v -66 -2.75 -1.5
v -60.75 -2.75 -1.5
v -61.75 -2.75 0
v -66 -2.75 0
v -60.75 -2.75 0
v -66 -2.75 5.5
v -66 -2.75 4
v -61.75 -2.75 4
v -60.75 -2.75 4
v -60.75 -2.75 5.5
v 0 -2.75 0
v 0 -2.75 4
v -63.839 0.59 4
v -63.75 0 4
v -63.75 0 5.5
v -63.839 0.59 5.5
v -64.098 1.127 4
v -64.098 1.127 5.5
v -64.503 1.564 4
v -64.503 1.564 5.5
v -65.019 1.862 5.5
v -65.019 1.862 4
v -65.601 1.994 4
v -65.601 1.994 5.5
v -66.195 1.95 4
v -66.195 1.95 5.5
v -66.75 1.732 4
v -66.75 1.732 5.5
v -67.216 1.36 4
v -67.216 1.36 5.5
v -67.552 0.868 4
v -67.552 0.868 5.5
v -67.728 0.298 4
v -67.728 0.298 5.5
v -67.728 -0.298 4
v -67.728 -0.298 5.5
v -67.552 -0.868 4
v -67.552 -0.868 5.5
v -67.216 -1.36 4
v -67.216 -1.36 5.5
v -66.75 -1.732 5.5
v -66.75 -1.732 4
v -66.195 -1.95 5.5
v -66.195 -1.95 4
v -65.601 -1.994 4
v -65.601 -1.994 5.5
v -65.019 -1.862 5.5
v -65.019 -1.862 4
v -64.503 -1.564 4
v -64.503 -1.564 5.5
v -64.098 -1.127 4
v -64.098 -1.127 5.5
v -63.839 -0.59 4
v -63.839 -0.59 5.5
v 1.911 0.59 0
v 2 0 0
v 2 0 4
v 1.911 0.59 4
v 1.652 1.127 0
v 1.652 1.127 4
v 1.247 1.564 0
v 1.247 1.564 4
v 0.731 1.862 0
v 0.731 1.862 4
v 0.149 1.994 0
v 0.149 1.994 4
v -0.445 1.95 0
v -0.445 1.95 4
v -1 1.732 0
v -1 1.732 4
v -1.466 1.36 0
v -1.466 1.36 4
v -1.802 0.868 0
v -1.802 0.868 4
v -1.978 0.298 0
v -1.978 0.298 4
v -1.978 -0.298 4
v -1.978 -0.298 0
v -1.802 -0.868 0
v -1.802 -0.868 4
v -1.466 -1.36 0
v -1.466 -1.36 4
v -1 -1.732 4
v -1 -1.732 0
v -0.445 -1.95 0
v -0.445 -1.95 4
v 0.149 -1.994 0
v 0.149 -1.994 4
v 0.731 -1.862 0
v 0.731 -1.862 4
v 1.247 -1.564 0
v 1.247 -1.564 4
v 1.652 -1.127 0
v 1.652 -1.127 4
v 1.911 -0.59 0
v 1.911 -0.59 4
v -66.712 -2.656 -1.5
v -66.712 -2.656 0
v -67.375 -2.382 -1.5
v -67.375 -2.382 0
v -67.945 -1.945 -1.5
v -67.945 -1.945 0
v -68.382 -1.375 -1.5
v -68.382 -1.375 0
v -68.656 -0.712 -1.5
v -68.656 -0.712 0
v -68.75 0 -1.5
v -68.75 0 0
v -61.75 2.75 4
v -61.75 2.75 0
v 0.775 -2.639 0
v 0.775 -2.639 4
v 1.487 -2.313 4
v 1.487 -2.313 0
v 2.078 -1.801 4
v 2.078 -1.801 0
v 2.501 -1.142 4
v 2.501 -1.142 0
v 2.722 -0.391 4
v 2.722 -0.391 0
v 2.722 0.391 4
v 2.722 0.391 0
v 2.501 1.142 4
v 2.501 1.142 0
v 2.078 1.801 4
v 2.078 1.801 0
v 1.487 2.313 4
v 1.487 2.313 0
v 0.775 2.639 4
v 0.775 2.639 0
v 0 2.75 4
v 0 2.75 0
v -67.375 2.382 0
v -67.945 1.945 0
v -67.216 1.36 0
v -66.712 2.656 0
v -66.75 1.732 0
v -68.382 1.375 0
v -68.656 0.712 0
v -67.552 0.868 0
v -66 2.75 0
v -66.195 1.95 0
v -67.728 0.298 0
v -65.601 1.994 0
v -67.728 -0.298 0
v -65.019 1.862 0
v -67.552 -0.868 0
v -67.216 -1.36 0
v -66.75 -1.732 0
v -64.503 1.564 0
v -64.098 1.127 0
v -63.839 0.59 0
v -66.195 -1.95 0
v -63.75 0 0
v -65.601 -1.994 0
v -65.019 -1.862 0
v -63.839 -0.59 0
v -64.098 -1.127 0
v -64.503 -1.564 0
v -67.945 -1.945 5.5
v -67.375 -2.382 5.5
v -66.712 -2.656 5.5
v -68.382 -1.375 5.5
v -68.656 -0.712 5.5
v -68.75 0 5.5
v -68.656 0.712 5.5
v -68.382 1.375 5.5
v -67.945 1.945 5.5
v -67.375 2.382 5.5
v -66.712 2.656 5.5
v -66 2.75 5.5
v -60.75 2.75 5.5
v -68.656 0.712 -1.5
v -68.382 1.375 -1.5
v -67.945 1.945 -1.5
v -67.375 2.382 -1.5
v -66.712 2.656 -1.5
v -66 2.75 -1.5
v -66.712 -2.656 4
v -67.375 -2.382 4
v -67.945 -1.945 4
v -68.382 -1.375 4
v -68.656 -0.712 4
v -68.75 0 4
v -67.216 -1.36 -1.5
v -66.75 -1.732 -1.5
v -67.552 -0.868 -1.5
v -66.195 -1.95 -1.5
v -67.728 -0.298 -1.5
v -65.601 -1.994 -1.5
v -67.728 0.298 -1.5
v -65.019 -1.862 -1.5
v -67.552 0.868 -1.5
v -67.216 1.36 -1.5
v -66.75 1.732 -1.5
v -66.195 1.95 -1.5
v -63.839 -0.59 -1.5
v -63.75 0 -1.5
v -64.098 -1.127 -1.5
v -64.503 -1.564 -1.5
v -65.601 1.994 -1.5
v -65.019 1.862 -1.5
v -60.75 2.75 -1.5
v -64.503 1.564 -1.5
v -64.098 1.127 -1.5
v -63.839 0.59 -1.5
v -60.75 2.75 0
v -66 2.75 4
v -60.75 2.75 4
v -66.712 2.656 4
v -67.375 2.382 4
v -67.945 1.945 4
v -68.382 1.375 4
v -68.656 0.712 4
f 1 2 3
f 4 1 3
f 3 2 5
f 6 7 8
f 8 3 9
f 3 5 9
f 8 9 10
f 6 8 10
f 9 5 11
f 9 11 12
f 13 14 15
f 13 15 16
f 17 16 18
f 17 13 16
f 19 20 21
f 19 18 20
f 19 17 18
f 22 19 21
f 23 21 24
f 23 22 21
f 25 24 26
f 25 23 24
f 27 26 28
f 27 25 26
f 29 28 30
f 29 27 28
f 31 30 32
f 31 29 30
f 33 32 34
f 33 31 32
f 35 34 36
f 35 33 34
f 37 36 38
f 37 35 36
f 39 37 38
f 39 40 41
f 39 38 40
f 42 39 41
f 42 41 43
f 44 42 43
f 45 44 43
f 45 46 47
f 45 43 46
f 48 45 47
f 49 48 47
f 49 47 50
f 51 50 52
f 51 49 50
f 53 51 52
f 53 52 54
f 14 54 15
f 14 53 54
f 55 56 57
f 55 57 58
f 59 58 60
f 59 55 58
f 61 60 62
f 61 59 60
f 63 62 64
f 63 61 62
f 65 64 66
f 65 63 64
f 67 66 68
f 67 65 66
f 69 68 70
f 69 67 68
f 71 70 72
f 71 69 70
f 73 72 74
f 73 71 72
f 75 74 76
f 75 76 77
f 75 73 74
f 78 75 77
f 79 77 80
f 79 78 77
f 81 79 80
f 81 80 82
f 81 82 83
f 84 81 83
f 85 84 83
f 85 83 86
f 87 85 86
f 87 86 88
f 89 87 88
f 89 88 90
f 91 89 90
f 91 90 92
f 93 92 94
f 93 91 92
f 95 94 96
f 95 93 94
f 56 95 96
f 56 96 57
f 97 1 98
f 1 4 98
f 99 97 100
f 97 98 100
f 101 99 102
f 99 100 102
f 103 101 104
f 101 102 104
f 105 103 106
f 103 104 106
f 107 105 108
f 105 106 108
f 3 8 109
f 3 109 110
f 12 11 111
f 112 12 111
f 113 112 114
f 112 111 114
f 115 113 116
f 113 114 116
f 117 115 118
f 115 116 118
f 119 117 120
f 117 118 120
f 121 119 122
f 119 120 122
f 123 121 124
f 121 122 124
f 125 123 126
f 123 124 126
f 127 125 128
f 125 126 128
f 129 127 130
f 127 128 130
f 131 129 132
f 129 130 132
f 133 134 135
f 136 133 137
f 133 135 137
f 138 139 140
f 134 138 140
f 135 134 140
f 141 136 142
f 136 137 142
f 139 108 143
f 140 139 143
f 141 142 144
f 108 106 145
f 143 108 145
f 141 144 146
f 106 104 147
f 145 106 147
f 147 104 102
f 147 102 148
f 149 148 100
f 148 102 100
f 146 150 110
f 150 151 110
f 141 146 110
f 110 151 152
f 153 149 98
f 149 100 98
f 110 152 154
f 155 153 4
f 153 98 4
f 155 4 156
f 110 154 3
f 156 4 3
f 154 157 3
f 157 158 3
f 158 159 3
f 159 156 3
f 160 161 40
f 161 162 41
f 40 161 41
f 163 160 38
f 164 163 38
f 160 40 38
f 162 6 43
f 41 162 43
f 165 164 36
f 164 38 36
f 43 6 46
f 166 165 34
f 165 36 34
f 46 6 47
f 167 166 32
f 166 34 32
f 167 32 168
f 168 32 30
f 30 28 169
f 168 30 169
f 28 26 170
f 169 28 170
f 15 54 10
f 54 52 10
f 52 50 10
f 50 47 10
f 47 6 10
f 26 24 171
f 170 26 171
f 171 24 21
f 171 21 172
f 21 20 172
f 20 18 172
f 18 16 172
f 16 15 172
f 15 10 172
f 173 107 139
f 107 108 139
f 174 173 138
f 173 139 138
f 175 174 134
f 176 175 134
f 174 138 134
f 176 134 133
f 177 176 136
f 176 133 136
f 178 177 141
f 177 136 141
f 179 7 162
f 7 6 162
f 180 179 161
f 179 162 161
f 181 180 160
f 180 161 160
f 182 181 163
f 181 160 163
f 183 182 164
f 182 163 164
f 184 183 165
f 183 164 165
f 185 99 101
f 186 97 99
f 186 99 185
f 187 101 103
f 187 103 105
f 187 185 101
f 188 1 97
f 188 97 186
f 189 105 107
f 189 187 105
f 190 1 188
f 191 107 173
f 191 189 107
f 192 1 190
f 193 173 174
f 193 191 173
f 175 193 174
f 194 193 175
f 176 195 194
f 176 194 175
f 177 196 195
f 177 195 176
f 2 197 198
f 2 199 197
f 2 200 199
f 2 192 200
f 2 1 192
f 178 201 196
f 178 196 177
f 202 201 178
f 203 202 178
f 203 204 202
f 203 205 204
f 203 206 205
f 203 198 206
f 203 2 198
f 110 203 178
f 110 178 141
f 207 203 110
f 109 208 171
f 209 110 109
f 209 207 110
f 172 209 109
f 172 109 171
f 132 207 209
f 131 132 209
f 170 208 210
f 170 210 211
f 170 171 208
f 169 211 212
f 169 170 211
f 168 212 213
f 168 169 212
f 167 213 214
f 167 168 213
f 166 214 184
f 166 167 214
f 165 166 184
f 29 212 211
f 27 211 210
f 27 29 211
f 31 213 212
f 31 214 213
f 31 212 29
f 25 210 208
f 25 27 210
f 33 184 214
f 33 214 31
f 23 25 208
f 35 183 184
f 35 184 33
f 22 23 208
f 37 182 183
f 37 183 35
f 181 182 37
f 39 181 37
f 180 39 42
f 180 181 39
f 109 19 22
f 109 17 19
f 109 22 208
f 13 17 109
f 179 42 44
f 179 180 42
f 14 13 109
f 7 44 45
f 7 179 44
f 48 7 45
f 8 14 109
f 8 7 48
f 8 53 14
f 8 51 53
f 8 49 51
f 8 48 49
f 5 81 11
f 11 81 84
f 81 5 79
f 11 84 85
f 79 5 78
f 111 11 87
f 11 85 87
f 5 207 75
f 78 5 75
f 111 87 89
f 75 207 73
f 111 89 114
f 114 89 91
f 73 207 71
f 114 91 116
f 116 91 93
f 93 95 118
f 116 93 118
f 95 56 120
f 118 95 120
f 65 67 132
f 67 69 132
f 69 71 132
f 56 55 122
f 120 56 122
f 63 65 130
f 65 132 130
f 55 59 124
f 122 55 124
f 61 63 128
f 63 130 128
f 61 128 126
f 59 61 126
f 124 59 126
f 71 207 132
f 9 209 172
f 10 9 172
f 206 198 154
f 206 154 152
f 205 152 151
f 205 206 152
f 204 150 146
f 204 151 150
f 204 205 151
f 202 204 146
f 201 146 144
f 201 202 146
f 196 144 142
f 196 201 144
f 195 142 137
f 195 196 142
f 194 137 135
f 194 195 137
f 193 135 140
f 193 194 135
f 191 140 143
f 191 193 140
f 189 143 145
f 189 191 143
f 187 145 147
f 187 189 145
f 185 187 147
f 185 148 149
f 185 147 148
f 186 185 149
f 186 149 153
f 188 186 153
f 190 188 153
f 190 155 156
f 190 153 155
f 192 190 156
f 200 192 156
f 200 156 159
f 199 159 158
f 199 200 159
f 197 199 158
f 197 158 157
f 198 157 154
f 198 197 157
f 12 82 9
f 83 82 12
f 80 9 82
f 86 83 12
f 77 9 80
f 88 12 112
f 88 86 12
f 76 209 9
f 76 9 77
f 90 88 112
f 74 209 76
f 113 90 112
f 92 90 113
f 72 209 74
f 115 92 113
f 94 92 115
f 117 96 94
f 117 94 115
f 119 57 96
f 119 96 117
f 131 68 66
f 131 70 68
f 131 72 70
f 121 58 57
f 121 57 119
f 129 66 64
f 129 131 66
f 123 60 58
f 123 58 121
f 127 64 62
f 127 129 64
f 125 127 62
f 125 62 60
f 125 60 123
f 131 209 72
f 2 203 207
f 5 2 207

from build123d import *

# Parameters (mm, degrees)
SKETCH1_R               = 2
BOSS_EXTRUDE1_DEPTH     = 4
SKETCH2_W               = 7
SKETCH2_H               = 5.5
BOSS_EXTRUDE2_DEPTH     = 8
CUT_EXTRUDE1_DEPTH      = 70.024452189
CUT_EXTRUDE1_DEPTH_BACK = 70.024452189
SKETCH4_W               = 7
SKETCH4_H               = 4
CUT_EXTRUDE2_DEPTH      = 70.024452189
CUT_EXTRUDE2_DEPTH_BACK = 70.024452189
SKETCH5_R               = 2
FILLET1_R               = 2.75


with BuildPart() as part:
    # Sketch1 → Boss-Extrude1 (new body)
    with BuildSketch(Plane.XY):
        with BuildLine():
            Line((0, 2.75), (-60.75, 2.75))
            Line((-60.75, 2.75), (-60.75, -2.75))
            Line((-60.75, -2.75), (0, -2.75))
            ThreePointArc((0, -2.75), (2.75, 0), (0, 2.75))
        make_face()
        Circle(SKETCH1_R, mode=Mode.SUBTRACT)
    extrude(amount=BOSS_EXTRUDE1_DEPTH)

    # Sketch2 → Boss-Extrude2 (add)
    with BuildSketch(Plane.ZY.offset(60.75)):
        with Locations((2, 0)):
            Rectangle(SKETCH2_W, SKETCH2_H)
    extrude(amount=BOSS_EXTRUDE2_DEPTH)

    # Sketch4 → Cut-Extrude1 (cut, two sides: drawn at the far end of the back side and taken through both)
    with BuildSketch(Plane(origin=(0, 0, 0), x_dir=(1, 0, 0), z_dir=(0, 1, 0)).offset(-CUT_EXTRUDE1_DEPTH_BACK)):
        with Locations((-65.25, -2)):
            Rectangle(SKETCH4_W, SKETCH4_H)
    extrude(amount=CUT_EXTRUDE1_DEPTH + CUT_EXTRUDE1_DEPTH_BACK, mode=Mode.SUBTRACT)

    # Sketch5 → Cut-Extrude2 (cut, two sides: drawn at the far end of the back side and taken through both)
    with BuildSketch(Plane.XY.offset(-CUT_EXTRUDE2_DEPTH_BACK)):
        with Locations((-65.75, 0)):
            Circle(SKETCH5_R)
    extrude(amount=CUT_EXTRUDE2_DEPTH + CUT_EXTRUDE2_DEPTH_BACK, mode=Mode.SUBTRACT)

    # Fillet1
    fillet1_edges = [part.edges().sort_by_distance(p)[0] for p in [
        (-68.75, -2.75, 4.75),
        (-68.75, -2.75, -0.75),
        (-68.75, 2.75, -0.75),
        (-68.75, 2.75, 4.75),
    ]]
    fillet(fillet1_edges, radius=FILLET1_R - 0.0001)  # a hair under: the kernel refuses the full size


solid = part.part
